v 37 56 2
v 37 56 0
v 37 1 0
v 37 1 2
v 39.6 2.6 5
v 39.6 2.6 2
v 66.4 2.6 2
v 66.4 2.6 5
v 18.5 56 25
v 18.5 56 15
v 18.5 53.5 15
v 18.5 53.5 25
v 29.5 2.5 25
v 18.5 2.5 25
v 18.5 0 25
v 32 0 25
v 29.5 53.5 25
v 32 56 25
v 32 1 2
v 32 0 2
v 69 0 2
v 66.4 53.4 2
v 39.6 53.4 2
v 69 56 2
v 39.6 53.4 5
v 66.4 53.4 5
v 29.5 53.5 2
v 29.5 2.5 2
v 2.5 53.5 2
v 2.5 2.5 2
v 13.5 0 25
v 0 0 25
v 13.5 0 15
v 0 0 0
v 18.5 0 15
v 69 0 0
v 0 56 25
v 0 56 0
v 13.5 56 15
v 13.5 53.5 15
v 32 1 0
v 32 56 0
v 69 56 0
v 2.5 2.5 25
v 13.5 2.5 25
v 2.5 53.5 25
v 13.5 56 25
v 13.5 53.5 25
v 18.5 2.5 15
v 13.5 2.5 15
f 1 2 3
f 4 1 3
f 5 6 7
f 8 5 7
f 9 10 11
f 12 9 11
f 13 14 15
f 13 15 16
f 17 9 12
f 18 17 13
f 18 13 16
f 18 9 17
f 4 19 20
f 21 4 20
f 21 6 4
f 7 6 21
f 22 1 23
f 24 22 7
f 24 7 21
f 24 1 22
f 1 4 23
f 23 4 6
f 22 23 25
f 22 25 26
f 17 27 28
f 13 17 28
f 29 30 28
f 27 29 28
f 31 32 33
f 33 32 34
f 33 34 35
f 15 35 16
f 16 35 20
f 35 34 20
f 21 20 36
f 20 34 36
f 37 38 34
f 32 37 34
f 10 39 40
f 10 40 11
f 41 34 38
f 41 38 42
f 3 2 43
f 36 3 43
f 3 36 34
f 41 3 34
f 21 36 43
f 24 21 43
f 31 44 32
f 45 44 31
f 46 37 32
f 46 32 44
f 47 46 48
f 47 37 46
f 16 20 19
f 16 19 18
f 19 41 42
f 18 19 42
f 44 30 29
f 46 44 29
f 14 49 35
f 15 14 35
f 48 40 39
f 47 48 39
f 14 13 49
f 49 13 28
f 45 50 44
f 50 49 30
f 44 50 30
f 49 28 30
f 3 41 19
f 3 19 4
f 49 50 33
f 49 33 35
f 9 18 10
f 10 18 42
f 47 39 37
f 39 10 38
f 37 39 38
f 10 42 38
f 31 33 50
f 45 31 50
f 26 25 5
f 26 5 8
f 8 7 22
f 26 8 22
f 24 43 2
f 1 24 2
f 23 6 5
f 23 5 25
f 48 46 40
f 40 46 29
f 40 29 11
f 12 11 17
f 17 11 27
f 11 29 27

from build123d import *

# Parameters (mm, degrees)
F1_DEPTH = 2
F0_W     = 5
F0_H     = 1
F0_W_2   = 26.8
F0_H_2   = 50.8
F2_DEPTH = 5
F0_H_3   = 2.5
F3_DEPTH = 15
F4_DEPTH = 25


with BuildPart() as f1:
    # F0 (on Top) → F1 (new body)
    with BuildSketch(Plane.XY):
        Polygon((2.5, 2.5), (13.5, 2.5), (18.5, 2.5), (29.5, 2.5), (29.5, 53.5), (18.5, 53.5), (13.5, 53.5), (2.5, 53.5), align=None)
    extrude(amount=F1_DEPTH)

    # F0 (on Top) → F3 (join)
    with BuildSketch(Plane.XY):
        with Locations((16, 1.25)):
            Rectangle(F0_W, F0_H_3)
        with Locations((16, 54.75)):
            Rectangle(F0_W, F0_H_3)
    extrude(amount=F3_DEPTH)



with BuildPart() as f1b:
    # F0 (on Top) → F1, piece 2 (new body)
    with BuildSketch(Plane.XY):
        with Locations((34.5, 0.5)):
            Rectangle(F0_W, F0_H)
        Polygon((37, 1), (37, 0), (69, 0), (69, 56), (37, 56), align=None)
        with Locations((53, 28)):
            Rectangle(F0_W_2, F0_H_2, mode=Mode.SUBTRACT)
    extrude(amount=F1_DEPTH)

    # F0 (on Top) → F2 (join)
    with BuildSketch(Plane.XY):
        with Locations((53, 28)):
            Rectangle(F0_W_2, F0_H_2)
    extrude(amount=F2_DEPTH)


with BuildPart() as f1_1:
    add(f1.part)

    add(f1b.part)  # F4 merges F1b
    # F0 (on Top) → F4 (join)
    with BuildSketch(Plane.XY):
        Polygon((0, 56), (0, 0), (13.5, 0), (13.5, 2.5), (2.5, 2.5), (2.5, 53.5), (13.5, 53.5), (13.5, 56), align=None)
        Polygon((18.5, 2.5), (18.5, 0), (32, 0), (32, 1), (32, 56), (18.5, 56), (18.5, 53.5), (29.5, 53.5), (29.5, 2.5), align=None)
    extrude(amount=F4_DEPTH)


solid = f1_1.part
